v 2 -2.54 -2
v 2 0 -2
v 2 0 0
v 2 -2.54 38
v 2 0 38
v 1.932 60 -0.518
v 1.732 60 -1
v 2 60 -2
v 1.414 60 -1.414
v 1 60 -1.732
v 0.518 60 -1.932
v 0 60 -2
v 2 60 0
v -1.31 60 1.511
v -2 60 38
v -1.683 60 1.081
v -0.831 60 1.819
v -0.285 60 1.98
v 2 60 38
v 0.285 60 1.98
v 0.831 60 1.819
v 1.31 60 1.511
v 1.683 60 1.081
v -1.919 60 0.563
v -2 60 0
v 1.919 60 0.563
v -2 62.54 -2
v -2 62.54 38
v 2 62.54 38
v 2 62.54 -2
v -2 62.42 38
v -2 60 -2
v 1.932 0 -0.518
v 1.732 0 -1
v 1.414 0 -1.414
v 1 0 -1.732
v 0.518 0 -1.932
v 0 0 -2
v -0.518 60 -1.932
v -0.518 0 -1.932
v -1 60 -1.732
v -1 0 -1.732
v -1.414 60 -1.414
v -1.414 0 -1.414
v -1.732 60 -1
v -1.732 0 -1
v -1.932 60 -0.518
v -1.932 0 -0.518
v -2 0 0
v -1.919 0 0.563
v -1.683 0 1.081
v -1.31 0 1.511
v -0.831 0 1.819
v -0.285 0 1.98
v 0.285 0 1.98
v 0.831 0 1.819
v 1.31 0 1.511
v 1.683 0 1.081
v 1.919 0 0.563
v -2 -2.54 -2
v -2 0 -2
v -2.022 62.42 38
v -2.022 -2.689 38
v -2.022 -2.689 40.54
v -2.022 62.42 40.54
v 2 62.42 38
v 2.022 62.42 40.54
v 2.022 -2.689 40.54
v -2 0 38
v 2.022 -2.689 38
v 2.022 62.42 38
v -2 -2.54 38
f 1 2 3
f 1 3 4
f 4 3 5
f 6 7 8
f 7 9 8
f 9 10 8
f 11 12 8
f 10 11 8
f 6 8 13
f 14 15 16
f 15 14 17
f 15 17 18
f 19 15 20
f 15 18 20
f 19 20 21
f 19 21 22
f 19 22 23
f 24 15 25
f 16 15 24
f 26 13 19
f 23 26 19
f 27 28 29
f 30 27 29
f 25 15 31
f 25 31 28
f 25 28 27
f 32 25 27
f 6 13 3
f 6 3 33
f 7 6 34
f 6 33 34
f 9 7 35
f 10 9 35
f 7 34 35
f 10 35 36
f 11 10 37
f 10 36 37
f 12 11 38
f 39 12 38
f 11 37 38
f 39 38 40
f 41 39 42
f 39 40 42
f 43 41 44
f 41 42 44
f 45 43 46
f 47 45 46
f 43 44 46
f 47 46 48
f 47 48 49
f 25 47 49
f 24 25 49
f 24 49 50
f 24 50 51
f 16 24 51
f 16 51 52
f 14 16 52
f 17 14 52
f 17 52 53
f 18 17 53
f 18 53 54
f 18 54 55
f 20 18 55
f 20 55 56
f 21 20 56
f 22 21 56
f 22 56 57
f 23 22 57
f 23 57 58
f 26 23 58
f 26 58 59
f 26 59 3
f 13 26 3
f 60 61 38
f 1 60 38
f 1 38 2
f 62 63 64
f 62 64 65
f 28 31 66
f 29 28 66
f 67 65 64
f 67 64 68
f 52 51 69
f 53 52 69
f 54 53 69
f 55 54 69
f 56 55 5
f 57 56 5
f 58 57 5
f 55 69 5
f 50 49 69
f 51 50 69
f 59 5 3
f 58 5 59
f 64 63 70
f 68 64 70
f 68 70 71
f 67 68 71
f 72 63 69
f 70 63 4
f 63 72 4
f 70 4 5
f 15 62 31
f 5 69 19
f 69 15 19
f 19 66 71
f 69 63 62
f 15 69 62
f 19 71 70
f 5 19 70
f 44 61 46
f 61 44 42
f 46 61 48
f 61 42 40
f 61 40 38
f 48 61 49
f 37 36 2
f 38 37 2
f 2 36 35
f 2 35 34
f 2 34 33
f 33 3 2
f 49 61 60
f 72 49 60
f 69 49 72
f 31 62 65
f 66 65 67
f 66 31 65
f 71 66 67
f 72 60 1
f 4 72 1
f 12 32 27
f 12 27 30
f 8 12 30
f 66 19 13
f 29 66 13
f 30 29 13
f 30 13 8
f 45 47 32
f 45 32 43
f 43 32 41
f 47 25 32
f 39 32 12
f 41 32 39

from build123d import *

# Parameters (mm, degrees)
SKETCH1_R           = 2
BOSS_EXTRUDE1_DEPTH = 60
SKETCH2_W           = 4
SKETCH2_H           = 40
BOSS_EXTRUDE2_DEPTH = 2.54
SKETCH3_W           = 4
SKETCH3_H           = 40
BOSS_EXTRUDE3_DEPTH = 2.54
SKETCH4_W           = 4.044012612
SKETCH4_H           = 65.108603045
BOSS_EXTRUDE4_DEPTH = 2.54


with BuildPart() as part:
    # Sketch1 → Boss-Extrude1 (new body)
    with BuildSketch(Plane(origin=(0, 0, 0), x_dir=(1, 0, 0), z_dir=(0, 1, 0))):
        Circle(SKETCH1_R)
    extrude(amount=BOSS_EXTRUDE1_DEPTH)

    # Sketch2 → Boss-Extrude2 (add)
    with BuildSketch(Plane.XZ):
        with Locations((0, 18)):
            Rectangle(SKETCH2_W, SKETCH2_H)
    extrude(amount=BOSS_EXTRUDE2_DEPTH)

    # Sketch3 → Boss-Extrude3 (add)
    with BuildSketch(Plane(origin=(0, 60, 0), x_dir=(1, 0, 0), z_dir=(0, 1, 0))):
        with Locations((0, -18)):
            Rectangle(SKETCH3_W, SKETCH3_H)
    extrude(amount=BOSS_EXTRUDE3_DEPTH)

    # Sketch4 → Boss-Extrude4 (add)
    with BuildSketch(Plane.XY.offset(38)):
        with Locations((0, 29.86519958)):
            Rectangle(SKETCH4_W, SKETCH4_H)
    extrude(amount=BOSS_EXTRUDE4_DEPTH)


solid = part.part
